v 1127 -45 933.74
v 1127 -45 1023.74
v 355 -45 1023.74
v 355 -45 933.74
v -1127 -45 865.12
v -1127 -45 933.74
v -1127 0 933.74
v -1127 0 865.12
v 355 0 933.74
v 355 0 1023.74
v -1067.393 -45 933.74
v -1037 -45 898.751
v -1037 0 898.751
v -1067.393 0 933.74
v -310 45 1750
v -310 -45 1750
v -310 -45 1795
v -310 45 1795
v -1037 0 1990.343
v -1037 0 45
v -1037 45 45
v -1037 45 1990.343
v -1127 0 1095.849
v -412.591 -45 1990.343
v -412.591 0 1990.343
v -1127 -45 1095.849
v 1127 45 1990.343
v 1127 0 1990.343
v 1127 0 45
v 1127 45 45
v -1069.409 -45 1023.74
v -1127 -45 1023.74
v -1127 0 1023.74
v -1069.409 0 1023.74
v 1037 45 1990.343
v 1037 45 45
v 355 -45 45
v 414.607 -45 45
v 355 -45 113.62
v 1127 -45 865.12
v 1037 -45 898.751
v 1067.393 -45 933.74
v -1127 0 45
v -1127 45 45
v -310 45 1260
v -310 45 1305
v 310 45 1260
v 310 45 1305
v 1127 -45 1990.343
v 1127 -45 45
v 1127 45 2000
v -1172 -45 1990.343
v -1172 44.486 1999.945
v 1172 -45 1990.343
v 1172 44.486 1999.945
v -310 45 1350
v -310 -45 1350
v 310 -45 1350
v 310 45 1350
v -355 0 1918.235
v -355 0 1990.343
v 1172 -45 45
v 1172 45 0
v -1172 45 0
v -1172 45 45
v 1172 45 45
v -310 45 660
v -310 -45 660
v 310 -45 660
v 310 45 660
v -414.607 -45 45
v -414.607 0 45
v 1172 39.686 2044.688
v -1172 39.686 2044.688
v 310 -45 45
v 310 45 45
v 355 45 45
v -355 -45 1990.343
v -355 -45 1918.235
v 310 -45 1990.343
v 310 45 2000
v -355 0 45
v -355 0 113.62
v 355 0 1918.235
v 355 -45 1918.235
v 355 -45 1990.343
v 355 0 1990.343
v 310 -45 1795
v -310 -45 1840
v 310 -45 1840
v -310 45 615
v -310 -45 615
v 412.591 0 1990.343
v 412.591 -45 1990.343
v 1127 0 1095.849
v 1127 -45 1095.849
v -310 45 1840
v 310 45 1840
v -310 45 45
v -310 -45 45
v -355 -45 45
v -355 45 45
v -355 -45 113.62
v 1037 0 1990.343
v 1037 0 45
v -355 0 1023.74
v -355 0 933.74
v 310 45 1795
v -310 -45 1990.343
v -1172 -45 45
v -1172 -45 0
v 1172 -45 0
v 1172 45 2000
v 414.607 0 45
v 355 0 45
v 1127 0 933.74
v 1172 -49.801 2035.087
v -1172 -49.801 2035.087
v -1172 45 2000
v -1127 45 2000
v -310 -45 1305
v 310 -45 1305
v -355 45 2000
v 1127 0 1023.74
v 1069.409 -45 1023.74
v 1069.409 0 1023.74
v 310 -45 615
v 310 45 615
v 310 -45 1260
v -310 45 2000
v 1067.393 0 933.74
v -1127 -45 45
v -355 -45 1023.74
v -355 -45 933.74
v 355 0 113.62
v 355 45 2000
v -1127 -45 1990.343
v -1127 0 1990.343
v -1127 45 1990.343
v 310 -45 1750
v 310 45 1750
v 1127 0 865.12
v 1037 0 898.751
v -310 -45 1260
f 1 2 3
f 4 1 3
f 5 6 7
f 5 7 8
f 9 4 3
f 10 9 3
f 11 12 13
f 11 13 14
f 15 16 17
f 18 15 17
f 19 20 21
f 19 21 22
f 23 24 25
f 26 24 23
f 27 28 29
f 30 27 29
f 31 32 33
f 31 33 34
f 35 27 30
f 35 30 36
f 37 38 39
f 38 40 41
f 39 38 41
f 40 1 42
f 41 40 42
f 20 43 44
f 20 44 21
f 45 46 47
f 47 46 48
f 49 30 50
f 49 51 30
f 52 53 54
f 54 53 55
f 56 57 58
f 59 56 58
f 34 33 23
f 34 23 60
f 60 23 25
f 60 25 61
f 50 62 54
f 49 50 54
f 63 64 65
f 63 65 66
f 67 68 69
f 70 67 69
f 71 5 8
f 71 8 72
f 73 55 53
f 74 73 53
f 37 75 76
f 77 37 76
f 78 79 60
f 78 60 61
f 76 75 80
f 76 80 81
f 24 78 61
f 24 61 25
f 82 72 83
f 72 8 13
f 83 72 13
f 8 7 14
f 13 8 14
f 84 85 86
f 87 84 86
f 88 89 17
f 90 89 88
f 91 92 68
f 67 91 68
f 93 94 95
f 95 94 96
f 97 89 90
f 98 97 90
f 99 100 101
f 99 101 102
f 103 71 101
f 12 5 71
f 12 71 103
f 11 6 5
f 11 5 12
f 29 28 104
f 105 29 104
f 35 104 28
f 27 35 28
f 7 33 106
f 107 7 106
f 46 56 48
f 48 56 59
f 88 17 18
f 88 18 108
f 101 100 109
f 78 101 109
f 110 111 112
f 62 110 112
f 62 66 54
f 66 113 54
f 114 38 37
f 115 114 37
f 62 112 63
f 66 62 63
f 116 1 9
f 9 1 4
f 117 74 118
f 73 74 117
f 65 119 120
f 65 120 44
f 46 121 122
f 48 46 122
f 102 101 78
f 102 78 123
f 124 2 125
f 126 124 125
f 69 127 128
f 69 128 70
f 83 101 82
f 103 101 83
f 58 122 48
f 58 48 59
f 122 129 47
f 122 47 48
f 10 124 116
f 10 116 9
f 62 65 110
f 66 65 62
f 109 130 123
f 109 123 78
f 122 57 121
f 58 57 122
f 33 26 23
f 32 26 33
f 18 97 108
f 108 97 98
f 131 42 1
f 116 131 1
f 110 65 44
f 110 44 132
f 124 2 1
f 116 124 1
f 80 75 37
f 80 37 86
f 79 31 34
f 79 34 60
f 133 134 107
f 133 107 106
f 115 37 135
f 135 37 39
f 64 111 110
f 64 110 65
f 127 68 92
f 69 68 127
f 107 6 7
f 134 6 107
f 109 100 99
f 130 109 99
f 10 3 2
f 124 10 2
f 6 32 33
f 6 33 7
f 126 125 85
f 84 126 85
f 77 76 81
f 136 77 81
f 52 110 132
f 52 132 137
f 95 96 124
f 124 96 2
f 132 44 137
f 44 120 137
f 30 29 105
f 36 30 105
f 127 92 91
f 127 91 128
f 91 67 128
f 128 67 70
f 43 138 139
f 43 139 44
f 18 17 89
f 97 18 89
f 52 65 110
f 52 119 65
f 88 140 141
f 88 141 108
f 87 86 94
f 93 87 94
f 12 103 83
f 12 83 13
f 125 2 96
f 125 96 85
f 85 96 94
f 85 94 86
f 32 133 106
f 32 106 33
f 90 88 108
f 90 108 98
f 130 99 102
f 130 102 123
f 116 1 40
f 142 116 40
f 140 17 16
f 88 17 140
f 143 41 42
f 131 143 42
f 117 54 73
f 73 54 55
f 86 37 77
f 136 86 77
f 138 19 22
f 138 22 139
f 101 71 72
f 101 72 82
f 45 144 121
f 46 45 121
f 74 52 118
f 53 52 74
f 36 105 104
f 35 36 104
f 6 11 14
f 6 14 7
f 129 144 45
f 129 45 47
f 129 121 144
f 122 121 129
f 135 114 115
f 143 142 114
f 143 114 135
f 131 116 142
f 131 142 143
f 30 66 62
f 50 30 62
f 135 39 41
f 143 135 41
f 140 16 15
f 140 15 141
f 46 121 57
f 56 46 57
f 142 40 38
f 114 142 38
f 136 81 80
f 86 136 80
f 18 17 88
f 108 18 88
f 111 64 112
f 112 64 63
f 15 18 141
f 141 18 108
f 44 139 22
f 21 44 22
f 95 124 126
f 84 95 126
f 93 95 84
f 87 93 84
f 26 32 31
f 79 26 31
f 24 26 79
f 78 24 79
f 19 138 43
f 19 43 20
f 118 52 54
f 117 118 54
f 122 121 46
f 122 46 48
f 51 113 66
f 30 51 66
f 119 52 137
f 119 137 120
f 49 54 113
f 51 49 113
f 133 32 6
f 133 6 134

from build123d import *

# Parameters (mm, degrees)
F0_W      = 2344
F0_H      = 90
F1_DEPTH  = 45
F2_W      = 90
F2_H      = 1945.34335
F5_DEPTH  = 45
F4_W      = 90
F4_H      = 1945.34335
F7_DEPTH  = 45
F8_W      = 45
F8_H      = 90
F8_W_2    = 2299
F9_DEPTH  = 45
F10_W     = 620
F10_H     = 45
F11_DEPTH = 90
F12_DEPTH = 90
F13_DEPTH = 45
F10_W_2   = 682
F10_H_2   = 90
F14_DEPTH = 45
F16_START = -45
F16_DEPTH = 45


# Not quite as in the source:
# - a feature names something its author has since deleted; it is built from what else it names


with BuildPart() as f1:
    # F0 (on Top) → F1 (new body)
    with BuildSketch(Plane.XY):
        Rectangle(F0_W, F0_H)
    extrude(amount=F1_DEPTH)


with BuildPart() as f5:
    # F2 (on face) → F5 (new body)
    with BuildSketch(Plane(origin=(-1172, 0, 0), x_dir=(0, -1, 0), z_dir=(-1, 0, 0))):
        with Locations((0, 1017.671675)):
            Rectangle(F2_W, F2_H)
        Polygon((-45, 2000), (-45, 1990.34335), (45, 1990.34335), align=None)
    extrude(amount=-F5_DEPTH)


with BuildPart() as f6_1:
    # F6: instance of F5
    add(f5.part.mirror(Plane.YZ))


with BuildPart() as f7:
    # F4 (on offset) → F7 (new body)
    with BuildSketch(Plane.YZ.offset(-310)):
        Polygon((-45, 1990.34335), (45, 1990.34335), (45, 2000), align=None)
        with Locations((0, 1017.671675)):
            Rectangle(F4_W, F4_H)
    extrude(amount=-F7_DEPTH)


with BuildPart() as f9:
    # F8 (on face) → F9 (new body)
    with BuildSketch(Plane(origin=(0, -211.6376922213, 1972.4637736601), x_dir=(1, 0, 0), z_dir=(0, -0.1066837724, 0.9942930014))):
        with Locations((-1149.5, 212.5941518041)):
            Rectangle(F8_W, F8_H)
        with Locations((22.5, 212.5941518041)):
            Rectangle(F8_W_2, F8_H)
    extrude(amount=F9_DEPTH)


with BuildPart() as f11:
    # F10 (on face) → F11 (new body)
    with BuildSketch(Plane.XZ.offset(45)):
        with Locations((0, 1282.5)):
            Rectangle(F10_W, F10_H)
    extrude(amount=-F11_DEPTH)


with BuildPart() as f11b:
    # F10 (on face) → F11, piece 2 (new body)
    with BuildSketch(Plane.XZ.offset(45)):
        with Locations((0, 1772.5)):
            Rectangle(F10_W, F10_H)
    extrude(amount=-F11_DEPTH)


with BuildPart() as f12:
    # F10 (on face) → F12 (new body)
    with BuildSketch(Plane.XZ.offset(45)):
        with Locations((0, 637.5)):
            Rectangle(F10_W, F10_H)
    extrude(amount=-F12_DEPTH)


with BuildPart() as f12b:
    # F10 (on face) → F12, piece 2 (new body)
    with BuildSketch(Plane.XZ.offset(45)):
        with Locations((0, 1327.5)):
            Rectangle(F10_W, F10_H)
    extrude(amount=-F12_DEPTH)


with BuildPart() as f12c:
    # F10 (on face) → F12, piece 3 (new body)
    with BuildSketch(Plane.XZ.offset(45)):
        with Locations((0, 1817.5)):
            Rectangle(F10_W, F10_H)
    extrude(amount=-F12_DEPTH)


with BuildPart() as f13:
    # F10 (on face) → F13 (new body)
    with BuildSketch(Plane.XZ.offset(45)):
        Polygon((-355, 1918.2352214167), (-355, 1990.34335), (-412.5908448117, 1990.34335), (-1037, 1208.5354810911), (-1037, 1064.3192239245), align=None)
        Polygon((-1037, 1064.3192239245), (-1037, 1208.5354810911), (-1127, 1095.8486192519), (-1127, 1023.7404906686), (-1069.4091551883, 1023.7404906686), align=None)
    extrude(amount=-F13_DEPTH)


with BuildPart() as f13b:
    # F10 (on face) → F13, piece 2 (new body)
    with BuildSketch(Plane.XZ.offset(45)):
        Polygon((-355, 45), (-355, 113.6202558639), (-1037, 898.751103838), (-1037, 761.5105921102), (-414.6066434275, 45), align=None)
        Polygon((-1067.3933565725, 933.7404906686), (-1127, 933.7404906686), (-1127, 865.1202348048), (-1037, 761.5105921102), (-1037, 898.751103838), align=None)
    extrude(amount=-F13_DEPTH)


with BuildPart() as f14:
    # F10 (on face) → F14 (new body)
    with BuildSketch(Plane.XZ.offset(45)):
        Polygon((-1037, 933.7404906686), (-1037, 1023.7404906686), (-1069.4091551883, 1023.7404906686), (-1127, 1023.7404906686), (-1127, 933.7404906686), (-1067.3933565725, 933.7404906686), align=None)
        with Locations((-696, 978.7404906686)):
            Rectangle(F10_W_2, F10_H_2)
    extrude(amount=-F14_DEPTH)


with BuildPart() as f15_1:
    # F15: instance of F13
    add(f13.part.mirror(Plane.YZ))


with BuildPart() as f15_2:
    # F15: instance of F13b
    add(f13b.part.mirror(Plane.YZ))


with BuildPart() as f15_3:
    # F15: instance of F7
    add(f7.part.mirror(Plane.YZ))


with BuildPart() as f15_4:
    # F15: instance of F14
    add(f14.part.mirror(Plane.YZ))


with BuildPart() as f16:
    # F10 (on face) → F16 (new body)
    with BuildSketch(Plane.XZ.offset(45).offset(F16_START)):
        Polygon((-1127, 1095.8486192519), (-1037, 1208.5354810911), (-1037, 1990.34335), (-1127, 1990.34335), align=None)
        Polygon((-1037, 1064.3192239245), (-1037, 1208.5354810911), (-1127, 1095.8486192519), (-1127, 1023.7404906686), (-1069.4091551883, 1023.7404906686), align=None)
        Polygon((-1037, 1023.7404906686), (-1037, 1064.3192239245), (-1069.4091551883, 1023.7404906686), align=None)
        Polygon((-1037, 933.7404906686), (-1037, 1023.7404906686), (-1069.4091551883, 1023.7404906686), (-1127, 1023.7404906686), (-1127, 933.7404906686), (-1067.3933565725, 933.7404906686), align=None)
        Polygon((-1037, 898.751103838), (-1037, 933.7404906686), (-1067.3933565725, 933.7404906686), align=None)
        Polygon((-1067.3933565725, 933.7404906686), (-1127, 933.7404906686), (-1127, 865.1202348048), (-1037, 761.5105921102), (-1037, 898.751103838), align=None)
        Polygon((-1037, 761.5105921102), (-1127, 865.1202348048), (-1127, 45), (-1037, 45), align=None)
    extrude(amount=-F16_DEPTH)


with BuildPart() as f17_1:
    # F17: instance of F16
    add(f16.part.mirror(Plane.YZ))


solid = Compound([f1.part, f5.part, f6_1.part, f7.part, f9.part, f11.part, f11b.part, f12.part, f12b.part, f12c.part, f13.part, f13b.part, f14.part, f15_1.part, f15_2.part, f15_3.part, f15_4.part, f16.part, f17_1.part])
